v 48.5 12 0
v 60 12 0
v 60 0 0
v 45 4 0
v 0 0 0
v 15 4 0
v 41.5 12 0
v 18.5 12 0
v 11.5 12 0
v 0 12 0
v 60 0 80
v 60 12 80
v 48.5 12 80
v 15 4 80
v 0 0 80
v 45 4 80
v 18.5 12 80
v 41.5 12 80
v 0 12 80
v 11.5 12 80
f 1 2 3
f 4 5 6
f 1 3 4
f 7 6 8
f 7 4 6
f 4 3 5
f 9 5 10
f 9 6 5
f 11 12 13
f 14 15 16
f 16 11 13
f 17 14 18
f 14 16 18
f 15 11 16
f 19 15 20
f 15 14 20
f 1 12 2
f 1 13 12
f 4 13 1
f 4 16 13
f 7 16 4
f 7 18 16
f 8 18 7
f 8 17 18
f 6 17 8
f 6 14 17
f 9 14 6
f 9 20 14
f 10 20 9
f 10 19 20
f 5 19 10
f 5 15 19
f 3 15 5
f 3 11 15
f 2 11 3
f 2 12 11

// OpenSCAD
$fn = 32;

// ----------------------------------------------------------------------
// V guide rail: doublev, 60 mm wide
// ----------------------------------------------------------------------

// --- parameters (mm) ---
rail_w = 60;              // rail width, X
base_t = 12;              // base plate thickness
v_depth = 8;              // V feature depth / height
v_half_w = 7;             // half width of the V at the base face
plate_t = 80;             // rail length, Z (the extrusion height)
groove_off = 15;          // offset of each groove from the centreline

centre_x = rail_w / 2;  // rail centreline
groove_a = centre_x - groove_off;  // axis of the first groove
groove_b = centre_x + groove_off;  // axis of the second groove

profile = [[0, 0], [60, 0], [60, 12], [48.5, 12], [45, 4], [41.5, 12], [18.5, 12], [15, 4], [11.5, 12], [0, 12]];  // primary outline, 10 points, counter clockwise

// --- the one profile operation ---
linear_extrude(height = plate_t) polygon(points = profile);
